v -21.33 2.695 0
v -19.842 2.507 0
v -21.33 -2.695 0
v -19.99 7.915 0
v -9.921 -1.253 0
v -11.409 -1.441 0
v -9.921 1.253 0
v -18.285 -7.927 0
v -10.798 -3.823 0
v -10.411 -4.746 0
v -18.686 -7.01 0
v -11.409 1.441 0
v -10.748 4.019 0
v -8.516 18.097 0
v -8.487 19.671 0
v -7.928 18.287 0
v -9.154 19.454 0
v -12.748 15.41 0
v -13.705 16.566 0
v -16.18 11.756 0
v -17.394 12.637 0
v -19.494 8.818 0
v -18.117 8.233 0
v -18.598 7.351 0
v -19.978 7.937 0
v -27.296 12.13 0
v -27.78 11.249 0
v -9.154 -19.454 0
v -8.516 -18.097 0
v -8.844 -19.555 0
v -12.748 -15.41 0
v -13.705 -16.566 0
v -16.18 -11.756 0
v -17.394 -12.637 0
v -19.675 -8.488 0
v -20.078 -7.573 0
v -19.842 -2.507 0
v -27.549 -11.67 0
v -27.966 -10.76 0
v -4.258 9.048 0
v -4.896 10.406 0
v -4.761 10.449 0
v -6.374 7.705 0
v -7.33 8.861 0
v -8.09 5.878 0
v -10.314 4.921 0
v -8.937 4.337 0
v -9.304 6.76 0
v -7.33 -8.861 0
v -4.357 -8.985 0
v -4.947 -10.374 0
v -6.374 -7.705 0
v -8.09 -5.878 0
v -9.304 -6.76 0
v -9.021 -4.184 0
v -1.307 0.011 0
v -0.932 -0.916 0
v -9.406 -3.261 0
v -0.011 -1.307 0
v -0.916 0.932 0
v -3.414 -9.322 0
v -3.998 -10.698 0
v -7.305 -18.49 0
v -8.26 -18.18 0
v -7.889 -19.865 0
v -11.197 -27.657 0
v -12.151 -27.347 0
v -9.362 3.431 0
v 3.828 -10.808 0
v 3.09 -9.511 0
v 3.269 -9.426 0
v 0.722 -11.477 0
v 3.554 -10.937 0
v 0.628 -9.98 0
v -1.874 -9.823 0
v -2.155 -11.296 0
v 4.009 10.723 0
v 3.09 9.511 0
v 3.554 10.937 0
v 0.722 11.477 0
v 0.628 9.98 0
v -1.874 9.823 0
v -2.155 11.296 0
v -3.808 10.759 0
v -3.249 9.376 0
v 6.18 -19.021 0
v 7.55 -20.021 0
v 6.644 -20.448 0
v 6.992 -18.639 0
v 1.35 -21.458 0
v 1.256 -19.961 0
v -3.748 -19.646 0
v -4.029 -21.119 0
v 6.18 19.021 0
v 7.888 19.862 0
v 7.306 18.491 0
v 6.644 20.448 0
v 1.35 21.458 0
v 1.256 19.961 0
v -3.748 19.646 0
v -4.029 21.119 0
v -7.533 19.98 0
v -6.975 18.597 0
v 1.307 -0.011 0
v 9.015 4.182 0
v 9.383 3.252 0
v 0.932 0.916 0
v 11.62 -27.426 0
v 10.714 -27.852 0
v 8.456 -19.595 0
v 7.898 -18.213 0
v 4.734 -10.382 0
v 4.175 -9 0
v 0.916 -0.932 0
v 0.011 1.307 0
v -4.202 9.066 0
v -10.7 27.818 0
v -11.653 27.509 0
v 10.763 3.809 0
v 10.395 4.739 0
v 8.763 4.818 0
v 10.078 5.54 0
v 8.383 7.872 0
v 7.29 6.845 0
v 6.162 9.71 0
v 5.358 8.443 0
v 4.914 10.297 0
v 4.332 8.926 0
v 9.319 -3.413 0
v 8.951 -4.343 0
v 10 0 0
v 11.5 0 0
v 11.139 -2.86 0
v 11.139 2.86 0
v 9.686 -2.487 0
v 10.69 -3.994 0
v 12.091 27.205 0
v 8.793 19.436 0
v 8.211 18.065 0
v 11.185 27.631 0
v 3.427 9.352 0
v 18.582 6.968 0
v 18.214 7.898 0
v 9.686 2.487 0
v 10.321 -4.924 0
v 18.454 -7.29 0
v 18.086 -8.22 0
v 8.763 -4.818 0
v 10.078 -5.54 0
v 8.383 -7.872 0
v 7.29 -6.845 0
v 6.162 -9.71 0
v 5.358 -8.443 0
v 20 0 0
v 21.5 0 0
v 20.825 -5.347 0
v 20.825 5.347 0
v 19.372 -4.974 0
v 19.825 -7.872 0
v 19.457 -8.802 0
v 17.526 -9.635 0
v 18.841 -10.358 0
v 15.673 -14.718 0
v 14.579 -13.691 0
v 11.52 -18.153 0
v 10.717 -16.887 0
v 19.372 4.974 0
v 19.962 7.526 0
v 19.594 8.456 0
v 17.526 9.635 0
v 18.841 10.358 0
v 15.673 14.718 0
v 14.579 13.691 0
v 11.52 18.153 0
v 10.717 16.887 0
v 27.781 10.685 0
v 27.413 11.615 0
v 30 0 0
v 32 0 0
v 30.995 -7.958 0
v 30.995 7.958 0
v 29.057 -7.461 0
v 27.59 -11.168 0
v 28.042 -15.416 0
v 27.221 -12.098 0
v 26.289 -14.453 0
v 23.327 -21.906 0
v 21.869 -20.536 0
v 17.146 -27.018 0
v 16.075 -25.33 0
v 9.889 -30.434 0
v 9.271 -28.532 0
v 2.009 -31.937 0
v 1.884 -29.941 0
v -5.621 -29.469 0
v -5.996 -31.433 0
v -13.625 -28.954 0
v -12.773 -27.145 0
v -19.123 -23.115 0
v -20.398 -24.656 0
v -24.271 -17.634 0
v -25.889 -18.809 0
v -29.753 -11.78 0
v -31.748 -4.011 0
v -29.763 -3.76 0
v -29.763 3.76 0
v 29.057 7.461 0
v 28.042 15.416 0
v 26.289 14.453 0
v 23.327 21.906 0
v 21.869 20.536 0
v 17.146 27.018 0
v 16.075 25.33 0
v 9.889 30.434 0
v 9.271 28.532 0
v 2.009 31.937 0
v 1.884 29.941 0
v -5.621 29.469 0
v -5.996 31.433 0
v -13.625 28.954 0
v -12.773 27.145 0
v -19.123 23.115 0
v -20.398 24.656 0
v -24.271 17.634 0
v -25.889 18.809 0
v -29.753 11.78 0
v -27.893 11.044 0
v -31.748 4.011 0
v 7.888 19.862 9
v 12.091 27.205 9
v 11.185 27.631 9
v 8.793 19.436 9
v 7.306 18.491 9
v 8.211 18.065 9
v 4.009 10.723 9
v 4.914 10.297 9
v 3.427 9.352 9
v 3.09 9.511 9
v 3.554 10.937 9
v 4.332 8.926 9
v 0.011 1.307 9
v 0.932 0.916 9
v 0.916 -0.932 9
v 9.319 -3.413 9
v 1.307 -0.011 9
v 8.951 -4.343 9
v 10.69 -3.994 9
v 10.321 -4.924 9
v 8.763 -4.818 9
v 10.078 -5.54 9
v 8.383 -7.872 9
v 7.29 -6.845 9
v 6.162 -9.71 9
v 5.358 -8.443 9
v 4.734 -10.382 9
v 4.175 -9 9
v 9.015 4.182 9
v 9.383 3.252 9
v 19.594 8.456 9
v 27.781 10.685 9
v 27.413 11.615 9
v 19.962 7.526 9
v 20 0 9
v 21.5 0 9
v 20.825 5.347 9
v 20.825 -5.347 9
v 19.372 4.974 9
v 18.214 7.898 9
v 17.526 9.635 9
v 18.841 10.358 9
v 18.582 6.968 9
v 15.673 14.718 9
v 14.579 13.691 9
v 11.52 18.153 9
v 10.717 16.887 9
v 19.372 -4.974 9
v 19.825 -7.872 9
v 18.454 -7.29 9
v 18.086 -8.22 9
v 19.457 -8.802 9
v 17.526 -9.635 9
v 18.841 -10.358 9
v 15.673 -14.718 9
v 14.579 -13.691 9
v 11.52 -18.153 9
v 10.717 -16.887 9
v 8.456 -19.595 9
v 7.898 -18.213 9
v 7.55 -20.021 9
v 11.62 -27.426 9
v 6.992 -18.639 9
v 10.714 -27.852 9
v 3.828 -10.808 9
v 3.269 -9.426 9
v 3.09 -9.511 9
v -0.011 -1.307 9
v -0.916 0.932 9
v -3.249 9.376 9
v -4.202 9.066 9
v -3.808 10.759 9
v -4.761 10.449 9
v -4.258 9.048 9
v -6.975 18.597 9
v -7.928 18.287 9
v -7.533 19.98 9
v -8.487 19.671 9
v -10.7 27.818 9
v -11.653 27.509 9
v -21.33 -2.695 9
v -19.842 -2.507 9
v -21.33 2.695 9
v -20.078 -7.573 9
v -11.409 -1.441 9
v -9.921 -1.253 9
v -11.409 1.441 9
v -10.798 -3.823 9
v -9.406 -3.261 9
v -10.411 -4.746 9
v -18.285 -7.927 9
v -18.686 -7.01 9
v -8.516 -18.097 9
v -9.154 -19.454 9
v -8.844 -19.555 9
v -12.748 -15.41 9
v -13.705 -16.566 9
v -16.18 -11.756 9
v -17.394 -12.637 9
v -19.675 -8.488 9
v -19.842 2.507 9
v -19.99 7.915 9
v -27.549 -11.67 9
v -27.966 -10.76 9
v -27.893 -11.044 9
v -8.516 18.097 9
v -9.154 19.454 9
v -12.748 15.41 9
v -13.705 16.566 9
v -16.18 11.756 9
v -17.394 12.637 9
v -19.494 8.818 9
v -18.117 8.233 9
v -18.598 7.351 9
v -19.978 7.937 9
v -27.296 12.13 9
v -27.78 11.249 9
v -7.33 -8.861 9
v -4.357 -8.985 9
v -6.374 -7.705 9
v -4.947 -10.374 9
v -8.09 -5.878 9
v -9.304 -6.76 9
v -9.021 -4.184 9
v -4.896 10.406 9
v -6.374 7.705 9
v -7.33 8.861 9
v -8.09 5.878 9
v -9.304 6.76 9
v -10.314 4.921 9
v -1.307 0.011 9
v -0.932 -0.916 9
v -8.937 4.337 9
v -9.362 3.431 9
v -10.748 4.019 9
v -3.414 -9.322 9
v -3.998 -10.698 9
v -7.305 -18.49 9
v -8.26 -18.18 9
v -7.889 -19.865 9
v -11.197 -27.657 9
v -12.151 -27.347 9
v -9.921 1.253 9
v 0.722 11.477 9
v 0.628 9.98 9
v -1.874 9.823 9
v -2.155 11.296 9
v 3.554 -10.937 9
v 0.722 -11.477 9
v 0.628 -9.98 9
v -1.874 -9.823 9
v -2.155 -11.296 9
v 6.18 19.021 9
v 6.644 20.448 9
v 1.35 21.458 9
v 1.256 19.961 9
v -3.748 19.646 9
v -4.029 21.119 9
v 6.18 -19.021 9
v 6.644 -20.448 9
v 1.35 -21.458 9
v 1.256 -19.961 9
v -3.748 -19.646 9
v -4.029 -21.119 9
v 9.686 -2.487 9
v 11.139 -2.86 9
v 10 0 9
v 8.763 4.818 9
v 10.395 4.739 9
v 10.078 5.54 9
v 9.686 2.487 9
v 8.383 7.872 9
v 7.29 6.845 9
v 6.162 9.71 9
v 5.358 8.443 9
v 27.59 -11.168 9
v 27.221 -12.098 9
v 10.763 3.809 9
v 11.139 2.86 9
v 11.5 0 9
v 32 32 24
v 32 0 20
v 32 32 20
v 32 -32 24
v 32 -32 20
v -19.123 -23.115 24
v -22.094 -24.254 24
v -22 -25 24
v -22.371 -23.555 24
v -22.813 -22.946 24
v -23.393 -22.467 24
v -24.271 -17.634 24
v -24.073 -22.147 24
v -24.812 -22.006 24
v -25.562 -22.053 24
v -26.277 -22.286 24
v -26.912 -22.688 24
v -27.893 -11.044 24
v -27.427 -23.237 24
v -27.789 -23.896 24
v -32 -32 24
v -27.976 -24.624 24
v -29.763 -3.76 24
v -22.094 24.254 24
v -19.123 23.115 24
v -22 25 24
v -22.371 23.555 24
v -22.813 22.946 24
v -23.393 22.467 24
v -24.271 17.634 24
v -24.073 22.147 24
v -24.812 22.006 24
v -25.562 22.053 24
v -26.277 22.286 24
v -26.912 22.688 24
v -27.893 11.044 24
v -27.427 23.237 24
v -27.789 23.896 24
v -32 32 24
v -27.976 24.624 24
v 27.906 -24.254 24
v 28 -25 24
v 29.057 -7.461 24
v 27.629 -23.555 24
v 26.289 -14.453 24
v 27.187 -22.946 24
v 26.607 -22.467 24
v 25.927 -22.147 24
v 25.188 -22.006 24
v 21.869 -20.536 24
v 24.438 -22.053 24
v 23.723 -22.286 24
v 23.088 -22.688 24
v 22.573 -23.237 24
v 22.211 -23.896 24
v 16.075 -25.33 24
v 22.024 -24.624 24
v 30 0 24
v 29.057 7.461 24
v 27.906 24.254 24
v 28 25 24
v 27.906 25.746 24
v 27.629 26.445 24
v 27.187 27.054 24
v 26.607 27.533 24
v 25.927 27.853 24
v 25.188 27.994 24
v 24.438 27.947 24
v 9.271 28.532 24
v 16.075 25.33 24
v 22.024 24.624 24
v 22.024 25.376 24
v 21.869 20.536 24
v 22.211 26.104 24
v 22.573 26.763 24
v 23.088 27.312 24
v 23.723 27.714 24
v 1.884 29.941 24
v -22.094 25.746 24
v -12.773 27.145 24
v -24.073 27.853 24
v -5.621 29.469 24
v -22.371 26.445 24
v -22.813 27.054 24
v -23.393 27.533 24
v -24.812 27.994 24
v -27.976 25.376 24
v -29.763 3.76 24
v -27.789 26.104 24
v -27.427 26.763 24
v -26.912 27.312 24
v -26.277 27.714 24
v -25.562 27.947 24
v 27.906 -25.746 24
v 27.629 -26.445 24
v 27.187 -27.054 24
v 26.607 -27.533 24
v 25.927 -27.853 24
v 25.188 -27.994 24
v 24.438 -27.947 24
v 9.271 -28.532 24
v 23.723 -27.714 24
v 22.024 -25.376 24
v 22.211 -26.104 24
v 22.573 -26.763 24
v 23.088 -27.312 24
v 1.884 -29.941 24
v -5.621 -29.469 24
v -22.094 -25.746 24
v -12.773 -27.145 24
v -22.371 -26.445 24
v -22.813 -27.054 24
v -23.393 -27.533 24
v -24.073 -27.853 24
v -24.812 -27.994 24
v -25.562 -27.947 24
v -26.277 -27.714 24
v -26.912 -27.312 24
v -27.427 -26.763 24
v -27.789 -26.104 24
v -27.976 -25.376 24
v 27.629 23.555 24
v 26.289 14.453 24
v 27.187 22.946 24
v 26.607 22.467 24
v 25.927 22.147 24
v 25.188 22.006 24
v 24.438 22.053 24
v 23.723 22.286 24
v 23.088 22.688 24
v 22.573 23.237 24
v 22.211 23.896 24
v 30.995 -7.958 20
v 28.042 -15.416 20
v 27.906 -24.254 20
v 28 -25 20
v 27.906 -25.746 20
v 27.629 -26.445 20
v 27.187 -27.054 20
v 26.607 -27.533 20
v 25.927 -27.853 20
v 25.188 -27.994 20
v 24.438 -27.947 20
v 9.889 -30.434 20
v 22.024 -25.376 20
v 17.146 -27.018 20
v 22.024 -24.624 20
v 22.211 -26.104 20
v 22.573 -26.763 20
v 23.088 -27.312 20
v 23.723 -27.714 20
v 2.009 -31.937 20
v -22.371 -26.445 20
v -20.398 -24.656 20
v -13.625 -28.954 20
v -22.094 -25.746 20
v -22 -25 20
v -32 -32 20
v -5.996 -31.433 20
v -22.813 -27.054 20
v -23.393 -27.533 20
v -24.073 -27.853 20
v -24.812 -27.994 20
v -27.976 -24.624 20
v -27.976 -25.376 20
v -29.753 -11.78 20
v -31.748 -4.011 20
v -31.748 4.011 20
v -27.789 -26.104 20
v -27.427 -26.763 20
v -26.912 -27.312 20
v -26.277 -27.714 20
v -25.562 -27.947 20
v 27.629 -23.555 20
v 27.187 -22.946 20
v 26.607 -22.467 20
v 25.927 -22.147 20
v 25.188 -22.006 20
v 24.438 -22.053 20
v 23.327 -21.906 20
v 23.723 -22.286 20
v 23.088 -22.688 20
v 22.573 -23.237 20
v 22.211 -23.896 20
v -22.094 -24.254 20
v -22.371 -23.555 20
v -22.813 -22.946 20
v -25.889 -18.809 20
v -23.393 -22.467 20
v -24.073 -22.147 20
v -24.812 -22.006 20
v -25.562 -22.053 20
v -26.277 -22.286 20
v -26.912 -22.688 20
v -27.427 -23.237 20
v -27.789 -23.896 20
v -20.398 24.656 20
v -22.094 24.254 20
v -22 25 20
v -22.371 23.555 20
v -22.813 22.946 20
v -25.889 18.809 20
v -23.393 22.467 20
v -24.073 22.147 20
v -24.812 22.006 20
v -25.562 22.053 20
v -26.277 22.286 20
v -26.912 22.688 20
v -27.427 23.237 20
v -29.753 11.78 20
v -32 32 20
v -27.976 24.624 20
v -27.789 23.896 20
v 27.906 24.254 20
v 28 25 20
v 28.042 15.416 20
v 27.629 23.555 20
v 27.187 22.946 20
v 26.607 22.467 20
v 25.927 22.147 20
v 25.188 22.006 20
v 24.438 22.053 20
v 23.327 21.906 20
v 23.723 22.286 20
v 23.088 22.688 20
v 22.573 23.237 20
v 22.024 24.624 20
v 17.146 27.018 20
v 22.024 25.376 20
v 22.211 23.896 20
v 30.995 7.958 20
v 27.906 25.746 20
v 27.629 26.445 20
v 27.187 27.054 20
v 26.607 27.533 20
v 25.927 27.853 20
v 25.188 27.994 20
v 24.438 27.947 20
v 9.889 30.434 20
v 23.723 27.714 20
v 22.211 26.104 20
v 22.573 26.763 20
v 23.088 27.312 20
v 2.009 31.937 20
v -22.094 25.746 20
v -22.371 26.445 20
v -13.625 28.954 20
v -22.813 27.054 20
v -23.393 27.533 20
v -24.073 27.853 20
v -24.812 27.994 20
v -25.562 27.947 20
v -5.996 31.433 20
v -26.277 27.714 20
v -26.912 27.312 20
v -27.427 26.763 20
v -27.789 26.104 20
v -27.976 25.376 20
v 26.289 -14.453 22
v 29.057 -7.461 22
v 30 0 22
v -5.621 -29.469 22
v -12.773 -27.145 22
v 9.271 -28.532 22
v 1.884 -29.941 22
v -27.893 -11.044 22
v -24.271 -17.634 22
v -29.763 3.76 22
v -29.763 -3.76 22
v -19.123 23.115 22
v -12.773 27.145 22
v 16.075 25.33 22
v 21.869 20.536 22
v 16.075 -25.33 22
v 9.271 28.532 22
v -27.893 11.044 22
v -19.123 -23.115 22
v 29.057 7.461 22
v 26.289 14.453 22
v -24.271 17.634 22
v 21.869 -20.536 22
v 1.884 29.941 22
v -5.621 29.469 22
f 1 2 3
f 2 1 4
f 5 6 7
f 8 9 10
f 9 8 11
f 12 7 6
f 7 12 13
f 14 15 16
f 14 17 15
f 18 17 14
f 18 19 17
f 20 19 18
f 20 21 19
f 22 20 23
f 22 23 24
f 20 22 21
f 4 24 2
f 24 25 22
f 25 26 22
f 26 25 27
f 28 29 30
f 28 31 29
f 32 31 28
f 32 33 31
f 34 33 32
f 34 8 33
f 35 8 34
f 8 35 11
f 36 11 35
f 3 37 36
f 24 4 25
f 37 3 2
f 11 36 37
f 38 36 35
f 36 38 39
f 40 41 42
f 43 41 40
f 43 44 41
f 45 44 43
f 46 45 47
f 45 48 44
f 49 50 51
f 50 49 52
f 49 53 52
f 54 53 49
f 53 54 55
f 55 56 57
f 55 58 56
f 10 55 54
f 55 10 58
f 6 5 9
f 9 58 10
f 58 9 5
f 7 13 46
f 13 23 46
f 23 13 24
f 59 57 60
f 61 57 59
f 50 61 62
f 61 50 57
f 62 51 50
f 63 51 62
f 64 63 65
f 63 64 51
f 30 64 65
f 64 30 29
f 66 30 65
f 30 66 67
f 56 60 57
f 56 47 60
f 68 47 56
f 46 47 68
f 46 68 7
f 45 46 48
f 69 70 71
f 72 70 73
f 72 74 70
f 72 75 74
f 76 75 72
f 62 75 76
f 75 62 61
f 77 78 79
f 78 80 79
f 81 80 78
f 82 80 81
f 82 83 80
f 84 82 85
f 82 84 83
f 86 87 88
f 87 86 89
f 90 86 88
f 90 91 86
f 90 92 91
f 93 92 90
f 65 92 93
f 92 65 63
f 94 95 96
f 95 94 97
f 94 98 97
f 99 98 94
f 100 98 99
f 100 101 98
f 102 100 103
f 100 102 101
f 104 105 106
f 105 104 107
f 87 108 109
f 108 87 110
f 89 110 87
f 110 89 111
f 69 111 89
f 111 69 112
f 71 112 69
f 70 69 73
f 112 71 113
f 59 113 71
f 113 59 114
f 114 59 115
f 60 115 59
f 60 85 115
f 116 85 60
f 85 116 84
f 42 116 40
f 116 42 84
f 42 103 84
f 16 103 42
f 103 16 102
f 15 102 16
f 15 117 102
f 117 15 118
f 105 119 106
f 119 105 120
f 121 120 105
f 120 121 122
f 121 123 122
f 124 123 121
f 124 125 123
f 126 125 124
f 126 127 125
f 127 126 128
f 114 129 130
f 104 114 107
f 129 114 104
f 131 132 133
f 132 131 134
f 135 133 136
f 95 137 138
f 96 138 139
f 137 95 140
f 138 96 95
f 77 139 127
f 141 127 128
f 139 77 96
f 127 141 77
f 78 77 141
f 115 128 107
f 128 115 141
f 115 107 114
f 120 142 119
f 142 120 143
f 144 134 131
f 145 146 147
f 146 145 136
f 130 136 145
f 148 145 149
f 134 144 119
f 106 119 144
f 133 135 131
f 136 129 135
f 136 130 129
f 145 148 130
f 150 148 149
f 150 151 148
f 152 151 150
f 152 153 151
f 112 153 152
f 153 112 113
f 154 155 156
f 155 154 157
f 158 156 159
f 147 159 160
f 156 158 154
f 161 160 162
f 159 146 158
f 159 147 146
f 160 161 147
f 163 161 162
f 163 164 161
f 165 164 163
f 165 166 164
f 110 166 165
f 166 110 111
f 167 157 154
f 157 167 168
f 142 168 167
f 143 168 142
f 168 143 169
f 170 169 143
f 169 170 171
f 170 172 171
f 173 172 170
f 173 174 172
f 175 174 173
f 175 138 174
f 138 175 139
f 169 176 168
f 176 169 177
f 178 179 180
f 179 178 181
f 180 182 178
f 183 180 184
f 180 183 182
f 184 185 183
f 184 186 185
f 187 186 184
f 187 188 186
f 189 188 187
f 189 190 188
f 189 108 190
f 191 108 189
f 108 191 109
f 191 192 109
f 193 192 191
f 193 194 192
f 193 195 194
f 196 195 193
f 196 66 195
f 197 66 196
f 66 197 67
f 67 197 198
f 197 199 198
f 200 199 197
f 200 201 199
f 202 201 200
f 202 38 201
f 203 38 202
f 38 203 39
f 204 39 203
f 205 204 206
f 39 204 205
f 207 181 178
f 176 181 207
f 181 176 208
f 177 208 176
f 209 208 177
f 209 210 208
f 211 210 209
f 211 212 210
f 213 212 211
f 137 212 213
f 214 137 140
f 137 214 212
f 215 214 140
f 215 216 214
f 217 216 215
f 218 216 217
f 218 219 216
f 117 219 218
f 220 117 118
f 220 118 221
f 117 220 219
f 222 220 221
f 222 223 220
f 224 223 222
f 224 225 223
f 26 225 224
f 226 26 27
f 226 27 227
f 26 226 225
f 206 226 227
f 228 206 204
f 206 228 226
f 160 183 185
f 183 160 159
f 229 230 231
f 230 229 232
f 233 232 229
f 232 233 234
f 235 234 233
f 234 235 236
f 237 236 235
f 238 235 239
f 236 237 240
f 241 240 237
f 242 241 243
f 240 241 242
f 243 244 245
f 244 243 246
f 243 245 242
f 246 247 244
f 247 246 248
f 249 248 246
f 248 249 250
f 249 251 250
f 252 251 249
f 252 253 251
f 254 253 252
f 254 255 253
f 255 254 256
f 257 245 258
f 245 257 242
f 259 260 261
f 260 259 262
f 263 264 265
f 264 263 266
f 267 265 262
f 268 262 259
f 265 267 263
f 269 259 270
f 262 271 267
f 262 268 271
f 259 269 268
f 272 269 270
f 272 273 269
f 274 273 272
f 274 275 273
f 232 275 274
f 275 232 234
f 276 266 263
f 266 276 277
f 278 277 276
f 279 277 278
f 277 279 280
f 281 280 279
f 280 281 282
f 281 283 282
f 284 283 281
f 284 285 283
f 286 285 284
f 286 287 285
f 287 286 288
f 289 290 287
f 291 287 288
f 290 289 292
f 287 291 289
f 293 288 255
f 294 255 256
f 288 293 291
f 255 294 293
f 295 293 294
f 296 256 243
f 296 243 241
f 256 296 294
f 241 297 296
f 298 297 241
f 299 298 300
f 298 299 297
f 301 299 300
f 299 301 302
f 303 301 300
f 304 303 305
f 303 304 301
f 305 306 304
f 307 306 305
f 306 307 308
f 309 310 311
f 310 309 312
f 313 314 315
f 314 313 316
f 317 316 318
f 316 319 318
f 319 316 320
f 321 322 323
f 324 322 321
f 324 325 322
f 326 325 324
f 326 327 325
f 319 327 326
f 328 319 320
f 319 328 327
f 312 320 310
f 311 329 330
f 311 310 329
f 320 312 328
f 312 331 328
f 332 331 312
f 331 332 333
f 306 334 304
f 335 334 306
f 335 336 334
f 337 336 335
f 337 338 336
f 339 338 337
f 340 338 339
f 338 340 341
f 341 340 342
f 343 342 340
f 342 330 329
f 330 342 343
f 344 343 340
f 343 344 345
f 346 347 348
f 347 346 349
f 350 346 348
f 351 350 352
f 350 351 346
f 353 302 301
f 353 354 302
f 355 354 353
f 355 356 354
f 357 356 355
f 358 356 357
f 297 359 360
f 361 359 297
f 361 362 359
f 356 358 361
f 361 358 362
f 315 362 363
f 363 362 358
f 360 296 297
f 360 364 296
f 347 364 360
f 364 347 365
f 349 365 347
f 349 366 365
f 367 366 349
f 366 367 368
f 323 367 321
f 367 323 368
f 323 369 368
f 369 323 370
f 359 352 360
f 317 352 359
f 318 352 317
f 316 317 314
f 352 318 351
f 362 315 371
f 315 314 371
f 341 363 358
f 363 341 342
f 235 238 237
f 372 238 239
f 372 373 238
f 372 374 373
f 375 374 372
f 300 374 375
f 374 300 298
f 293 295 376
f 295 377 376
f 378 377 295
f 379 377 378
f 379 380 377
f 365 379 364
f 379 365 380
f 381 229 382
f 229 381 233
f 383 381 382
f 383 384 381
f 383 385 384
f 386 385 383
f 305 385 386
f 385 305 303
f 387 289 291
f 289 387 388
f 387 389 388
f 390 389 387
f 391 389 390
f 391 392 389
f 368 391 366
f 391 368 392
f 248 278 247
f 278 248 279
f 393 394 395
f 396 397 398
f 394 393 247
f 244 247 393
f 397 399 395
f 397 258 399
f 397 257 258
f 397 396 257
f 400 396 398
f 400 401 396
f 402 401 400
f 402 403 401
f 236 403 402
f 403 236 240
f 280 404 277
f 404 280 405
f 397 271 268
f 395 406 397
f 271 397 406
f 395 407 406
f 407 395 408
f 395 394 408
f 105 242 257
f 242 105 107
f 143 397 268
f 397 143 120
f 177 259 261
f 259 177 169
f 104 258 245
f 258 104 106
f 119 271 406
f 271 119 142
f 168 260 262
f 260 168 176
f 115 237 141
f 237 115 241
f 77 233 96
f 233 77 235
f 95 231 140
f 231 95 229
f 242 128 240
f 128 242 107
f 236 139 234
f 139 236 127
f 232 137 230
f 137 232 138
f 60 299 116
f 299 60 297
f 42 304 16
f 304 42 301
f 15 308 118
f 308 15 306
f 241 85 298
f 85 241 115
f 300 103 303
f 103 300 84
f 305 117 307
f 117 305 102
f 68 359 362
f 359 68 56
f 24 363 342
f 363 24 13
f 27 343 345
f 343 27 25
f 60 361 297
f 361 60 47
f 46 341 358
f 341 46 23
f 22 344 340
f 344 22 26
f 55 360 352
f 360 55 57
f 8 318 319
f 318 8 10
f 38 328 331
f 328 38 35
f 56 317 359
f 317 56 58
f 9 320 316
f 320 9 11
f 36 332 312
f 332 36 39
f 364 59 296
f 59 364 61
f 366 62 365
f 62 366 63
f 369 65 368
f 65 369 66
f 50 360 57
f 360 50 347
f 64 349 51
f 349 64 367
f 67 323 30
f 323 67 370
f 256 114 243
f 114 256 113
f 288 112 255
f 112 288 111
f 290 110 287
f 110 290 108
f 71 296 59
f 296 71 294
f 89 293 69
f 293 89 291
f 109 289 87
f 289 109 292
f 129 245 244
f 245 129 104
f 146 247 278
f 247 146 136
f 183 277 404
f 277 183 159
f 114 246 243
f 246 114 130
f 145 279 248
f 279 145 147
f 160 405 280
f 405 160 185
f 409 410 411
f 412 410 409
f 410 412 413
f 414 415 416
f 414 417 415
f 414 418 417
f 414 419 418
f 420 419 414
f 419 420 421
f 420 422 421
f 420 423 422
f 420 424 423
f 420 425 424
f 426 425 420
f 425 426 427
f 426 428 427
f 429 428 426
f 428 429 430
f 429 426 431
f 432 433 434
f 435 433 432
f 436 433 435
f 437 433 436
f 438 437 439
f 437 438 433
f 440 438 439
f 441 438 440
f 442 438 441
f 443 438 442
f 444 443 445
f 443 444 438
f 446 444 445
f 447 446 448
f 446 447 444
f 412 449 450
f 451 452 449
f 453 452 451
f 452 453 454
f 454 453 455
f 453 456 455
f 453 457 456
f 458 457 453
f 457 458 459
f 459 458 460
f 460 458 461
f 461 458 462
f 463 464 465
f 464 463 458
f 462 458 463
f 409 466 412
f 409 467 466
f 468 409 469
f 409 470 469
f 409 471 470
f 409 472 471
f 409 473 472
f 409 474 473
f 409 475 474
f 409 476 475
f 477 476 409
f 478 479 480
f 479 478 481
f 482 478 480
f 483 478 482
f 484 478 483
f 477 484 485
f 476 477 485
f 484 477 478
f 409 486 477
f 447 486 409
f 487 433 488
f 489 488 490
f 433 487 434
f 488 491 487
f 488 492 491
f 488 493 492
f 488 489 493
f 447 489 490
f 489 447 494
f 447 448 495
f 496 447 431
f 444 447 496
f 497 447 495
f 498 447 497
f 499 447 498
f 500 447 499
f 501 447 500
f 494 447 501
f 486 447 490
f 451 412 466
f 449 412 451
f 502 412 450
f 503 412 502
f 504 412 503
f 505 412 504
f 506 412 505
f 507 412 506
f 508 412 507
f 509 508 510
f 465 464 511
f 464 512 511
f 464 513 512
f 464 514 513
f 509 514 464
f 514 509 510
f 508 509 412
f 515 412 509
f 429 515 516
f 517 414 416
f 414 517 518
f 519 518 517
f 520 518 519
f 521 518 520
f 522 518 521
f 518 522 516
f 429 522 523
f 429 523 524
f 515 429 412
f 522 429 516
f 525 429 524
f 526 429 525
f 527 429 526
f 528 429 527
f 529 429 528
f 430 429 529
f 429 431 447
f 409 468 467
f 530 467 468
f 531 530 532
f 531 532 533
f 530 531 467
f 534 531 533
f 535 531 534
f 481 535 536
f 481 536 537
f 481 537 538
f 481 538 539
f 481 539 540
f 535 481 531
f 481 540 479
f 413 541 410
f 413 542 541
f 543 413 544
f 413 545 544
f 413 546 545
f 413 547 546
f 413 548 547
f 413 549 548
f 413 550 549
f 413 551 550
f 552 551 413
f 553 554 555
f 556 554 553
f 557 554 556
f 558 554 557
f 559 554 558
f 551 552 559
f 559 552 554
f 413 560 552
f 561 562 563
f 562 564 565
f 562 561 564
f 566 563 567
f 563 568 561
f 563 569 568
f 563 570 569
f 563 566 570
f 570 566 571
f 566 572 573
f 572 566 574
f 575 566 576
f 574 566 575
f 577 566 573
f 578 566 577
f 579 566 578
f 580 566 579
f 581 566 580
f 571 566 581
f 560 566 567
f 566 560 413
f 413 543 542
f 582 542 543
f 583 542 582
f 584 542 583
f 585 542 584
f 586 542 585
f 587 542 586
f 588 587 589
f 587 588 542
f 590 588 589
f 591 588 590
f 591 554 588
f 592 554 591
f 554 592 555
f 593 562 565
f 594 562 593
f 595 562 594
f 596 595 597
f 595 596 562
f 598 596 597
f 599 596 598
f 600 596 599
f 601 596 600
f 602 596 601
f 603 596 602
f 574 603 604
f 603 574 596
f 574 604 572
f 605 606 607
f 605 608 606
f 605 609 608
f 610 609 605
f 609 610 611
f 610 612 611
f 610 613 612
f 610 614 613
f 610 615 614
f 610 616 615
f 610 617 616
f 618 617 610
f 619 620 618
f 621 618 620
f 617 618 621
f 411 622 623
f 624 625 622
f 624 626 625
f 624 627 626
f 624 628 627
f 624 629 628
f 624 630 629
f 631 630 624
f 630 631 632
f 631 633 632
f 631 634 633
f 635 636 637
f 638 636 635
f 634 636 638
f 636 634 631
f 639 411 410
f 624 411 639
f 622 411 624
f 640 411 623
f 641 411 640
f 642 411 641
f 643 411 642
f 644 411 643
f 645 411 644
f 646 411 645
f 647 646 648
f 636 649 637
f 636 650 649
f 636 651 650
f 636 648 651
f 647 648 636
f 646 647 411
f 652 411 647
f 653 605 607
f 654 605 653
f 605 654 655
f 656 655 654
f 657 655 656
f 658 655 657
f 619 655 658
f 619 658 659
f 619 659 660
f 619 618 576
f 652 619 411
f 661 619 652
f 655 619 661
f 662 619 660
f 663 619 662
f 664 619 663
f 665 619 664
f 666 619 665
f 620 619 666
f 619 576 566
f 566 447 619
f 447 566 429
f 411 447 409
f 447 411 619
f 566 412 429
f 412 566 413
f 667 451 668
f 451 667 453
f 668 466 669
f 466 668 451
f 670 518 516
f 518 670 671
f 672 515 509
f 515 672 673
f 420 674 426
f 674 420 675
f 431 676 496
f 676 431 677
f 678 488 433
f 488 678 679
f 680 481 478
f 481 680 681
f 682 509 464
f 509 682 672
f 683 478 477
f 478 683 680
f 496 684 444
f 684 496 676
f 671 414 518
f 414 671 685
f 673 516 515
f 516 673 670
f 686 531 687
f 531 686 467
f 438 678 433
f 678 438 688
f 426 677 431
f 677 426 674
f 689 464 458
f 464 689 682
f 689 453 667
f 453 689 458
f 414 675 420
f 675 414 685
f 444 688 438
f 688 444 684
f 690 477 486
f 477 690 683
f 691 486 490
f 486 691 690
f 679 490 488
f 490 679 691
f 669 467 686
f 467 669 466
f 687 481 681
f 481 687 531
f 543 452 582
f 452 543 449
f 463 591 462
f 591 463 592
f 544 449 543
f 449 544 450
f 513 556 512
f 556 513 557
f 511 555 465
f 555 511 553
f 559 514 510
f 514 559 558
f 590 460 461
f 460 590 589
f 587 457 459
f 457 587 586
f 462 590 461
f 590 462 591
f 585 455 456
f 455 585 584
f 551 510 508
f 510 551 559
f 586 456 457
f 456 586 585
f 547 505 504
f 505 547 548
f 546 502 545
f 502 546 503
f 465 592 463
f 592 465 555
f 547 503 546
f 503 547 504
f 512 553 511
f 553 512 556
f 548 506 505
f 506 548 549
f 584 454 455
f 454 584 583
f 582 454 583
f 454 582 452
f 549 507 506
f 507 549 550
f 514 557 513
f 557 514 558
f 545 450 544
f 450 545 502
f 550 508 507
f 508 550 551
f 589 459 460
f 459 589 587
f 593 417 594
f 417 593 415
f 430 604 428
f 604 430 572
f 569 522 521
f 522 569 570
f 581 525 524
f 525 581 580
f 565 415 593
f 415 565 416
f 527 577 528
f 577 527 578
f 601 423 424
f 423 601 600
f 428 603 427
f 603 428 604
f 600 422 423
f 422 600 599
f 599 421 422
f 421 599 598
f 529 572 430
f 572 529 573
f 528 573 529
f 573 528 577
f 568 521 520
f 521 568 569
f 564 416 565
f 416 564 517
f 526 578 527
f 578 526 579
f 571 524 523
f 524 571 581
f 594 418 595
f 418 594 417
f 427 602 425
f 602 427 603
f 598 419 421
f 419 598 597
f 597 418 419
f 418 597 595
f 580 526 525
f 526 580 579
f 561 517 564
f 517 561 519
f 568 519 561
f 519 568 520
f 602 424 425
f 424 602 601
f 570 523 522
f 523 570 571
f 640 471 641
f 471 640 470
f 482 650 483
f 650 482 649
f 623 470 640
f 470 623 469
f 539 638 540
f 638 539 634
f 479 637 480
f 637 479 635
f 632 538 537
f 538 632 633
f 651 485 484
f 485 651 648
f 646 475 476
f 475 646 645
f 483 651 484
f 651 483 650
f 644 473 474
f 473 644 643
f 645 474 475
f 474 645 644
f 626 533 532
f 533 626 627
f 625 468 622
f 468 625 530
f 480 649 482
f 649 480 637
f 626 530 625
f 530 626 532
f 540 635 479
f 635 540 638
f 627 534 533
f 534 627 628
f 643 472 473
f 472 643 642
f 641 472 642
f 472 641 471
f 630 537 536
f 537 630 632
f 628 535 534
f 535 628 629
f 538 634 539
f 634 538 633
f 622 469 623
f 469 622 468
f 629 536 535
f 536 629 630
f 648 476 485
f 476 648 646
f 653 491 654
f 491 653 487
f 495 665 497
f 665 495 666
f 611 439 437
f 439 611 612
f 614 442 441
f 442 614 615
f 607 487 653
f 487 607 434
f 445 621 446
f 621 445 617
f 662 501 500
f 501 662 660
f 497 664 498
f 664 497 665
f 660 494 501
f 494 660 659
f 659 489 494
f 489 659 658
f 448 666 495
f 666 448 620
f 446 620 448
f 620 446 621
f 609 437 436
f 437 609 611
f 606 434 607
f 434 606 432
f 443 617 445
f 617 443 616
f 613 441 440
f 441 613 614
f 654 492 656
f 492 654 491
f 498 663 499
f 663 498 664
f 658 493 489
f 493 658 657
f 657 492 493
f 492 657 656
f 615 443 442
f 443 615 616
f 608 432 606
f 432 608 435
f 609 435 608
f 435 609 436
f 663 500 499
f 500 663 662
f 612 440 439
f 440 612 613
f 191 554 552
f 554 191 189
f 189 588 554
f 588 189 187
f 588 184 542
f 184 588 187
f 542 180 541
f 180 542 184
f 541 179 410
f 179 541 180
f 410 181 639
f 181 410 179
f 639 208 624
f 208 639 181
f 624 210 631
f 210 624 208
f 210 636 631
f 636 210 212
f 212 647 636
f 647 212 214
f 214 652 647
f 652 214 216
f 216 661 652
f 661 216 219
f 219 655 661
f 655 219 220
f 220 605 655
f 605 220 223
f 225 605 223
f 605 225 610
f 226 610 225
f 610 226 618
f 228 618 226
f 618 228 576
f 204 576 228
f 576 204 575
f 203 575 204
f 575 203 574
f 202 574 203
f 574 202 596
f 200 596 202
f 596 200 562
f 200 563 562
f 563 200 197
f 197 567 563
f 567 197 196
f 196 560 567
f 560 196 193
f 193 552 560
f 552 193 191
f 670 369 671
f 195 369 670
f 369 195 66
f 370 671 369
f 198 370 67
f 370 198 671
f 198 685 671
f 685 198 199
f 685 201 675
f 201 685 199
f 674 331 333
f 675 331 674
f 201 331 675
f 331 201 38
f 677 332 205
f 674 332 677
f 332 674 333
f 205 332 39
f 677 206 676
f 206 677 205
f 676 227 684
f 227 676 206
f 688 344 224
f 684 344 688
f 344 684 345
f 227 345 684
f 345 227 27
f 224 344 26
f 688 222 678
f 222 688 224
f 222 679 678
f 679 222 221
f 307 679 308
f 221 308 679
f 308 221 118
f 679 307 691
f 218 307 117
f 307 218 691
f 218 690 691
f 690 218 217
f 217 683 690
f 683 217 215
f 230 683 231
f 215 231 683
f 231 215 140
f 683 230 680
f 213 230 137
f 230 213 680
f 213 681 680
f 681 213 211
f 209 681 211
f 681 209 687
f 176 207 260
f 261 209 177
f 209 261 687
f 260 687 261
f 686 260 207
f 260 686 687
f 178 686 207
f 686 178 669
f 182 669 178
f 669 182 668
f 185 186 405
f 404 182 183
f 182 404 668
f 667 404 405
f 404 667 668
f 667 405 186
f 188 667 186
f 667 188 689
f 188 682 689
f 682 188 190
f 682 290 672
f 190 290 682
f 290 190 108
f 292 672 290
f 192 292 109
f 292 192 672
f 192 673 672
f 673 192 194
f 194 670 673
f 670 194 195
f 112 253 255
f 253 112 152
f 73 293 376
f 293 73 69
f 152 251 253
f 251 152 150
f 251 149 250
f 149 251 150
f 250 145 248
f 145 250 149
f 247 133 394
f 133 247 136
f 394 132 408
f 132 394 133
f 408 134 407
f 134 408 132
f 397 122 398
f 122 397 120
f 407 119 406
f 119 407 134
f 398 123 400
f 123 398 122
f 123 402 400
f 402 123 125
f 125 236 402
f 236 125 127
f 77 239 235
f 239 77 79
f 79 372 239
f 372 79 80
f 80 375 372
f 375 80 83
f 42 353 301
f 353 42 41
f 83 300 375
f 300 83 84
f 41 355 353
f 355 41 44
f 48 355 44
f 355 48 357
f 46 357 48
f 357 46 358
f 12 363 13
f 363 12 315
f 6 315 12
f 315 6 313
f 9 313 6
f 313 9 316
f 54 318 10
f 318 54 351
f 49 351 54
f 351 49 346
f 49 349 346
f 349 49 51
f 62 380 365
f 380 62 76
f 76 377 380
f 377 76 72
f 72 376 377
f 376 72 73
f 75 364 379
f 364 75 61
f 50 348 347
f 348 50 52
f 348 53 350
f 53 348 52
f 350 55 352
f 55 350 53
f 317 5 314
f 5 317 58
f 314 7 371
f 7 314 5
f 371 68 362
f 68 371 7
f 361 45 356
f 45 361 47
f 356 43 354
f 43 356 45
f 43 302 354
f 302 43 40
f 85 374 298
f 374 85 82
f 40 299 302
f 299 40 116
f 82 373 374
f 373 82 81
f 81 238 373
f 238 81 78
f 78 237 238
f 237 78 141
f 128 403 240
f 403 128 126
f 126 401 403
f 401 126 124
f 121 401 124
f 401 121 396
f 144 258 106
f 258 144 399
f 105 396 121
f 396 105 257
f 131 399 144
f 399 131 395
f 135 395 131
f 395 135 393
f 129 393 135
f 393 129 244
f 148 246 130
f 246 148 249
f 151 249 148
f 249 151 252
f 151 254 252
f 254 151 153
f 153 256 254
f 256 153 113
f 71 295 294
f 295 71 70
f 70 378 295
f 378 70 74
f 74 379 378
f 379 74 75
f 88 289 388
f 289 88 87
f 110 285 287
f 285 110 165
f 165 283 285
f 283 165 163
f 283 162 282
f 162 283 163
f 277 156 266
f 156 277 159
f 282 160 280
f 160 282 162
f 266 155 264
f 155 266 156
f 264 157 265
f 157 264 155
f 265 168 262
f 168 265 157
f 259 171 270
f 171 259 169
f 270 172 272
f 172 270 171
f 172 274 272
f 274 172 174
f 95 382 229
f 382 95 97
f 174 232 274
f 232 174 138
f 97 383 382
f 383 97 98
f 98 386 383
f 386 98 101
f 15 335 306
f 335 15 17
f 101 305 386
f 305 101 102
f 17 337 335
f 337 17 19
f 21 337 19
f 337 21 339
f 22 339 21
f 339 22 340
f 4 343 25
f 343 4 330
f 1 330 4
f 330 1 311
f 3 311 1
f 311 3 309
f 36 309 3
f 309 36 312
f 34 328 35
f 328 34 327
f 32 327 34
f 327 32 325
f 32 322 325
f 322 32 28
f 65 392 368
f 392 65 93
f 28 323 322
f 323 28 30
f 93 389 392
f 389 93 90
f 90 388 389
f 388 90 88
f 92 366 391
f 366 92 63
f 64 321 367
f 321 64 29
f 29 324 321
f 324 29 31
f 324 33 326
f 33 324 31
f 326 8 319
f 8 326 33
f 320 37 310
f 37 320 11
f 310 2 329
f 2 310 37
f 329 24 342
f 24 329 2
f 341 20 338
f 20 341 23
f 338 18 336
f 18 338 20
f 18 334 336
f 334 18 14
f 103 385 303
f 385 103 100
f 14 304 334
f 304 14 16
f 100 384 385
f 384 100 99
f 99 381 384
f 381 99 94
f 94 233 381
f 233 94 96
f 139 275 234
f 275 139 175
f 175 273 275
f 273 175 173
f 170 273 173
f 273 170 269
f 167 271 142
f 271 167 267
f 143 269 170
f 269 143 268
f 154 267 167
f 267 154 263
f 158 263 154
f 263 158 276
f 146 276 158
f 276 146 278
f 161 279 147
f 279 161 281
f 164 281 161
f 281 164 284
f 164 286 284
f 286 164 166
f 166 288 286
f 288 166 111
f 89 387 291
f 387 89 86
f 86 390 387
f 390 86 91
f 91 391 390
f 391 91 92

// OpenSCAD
// file: root.scad
//Copyright 2024 Chris/abstractedfox.
//This work is not licensed for use as source or training data for any language model, neural network,
//AI tool or product, or other software which aggregates or processes material in a way that may be used to generate
//new or derived content from or based on the input set, or used to build a data set or training model for any software or
//tooling which facilitates the use or operation of such software.

//root.scad: Common parameters/functions used in other files

resolutionProd = 300;
resolutionTesting = 25;
resolution = resolutionTesting;

$fn = resolution;

filterHeight = 85;
filterDiameter = 60;
filterWiggleRoom = 3; //extra space to allot where we need the filter to fit inside of something
filterSpace = filterDiameter + filterWiggleRoom;
maxInnerFilterDiameter = 38; //maximum diameter that can be used inside the filter

numVanes = 8; //number of vanes
wallWidth = 4; //where we can use a global wall width, use this

shroudDepth = 10; //Wherever we put a 'shroud' in the filter (to try to force more air through it instead of around it), this is how large it should be

tolerance = 0.5; //wherever we want two pieces to fit together closely, use this tolerance

//Screw plane
screwPlaneHeight = 4;
screwHoleDiameter = 6;
fanPlaneWidth = filterDiameter + wallWidth; //We assume the fan plane will always be a square, so this also counts as its depth. Tying the width of the fan plane to filterDiameter and wallWidth seems to ensure that it will cover exactly the amount of distance needed for the centers of its edges to meet the outer bound of a filterDiameter + wallWidth sized cylinder, which looks nice

//distance of the screwholes from the center of the fan plane
screwDistanceDefault = 25;

module screwHoleCutouts(taperAmnt, height, setScrewDistance = screwDistanceDefault){
    rotate([180,0,0]){
        translate([setScrewDistance, setScrewDistance, - 3]){
            linear_extrude(height = height, scale = taperAmnt){
                circle(d = screwHoleDiameter);
            }
        }
                
        translate([-setScrewDistance, setScrewDistance, - 3]){
            linear_extrude(height = height, scale = taperAmnt){
                circle(d = screwHoleDiameter);
            }
        }
        
        translate([setScrewDistance, -setScrewDistance, - 3]){
            linear_extrude(height = height, scale = taperAmnt){
                circle(d = screwHoleDiameter);
            }
        }
        
        translate([-setScrewDistance, -setScrewDistance, - 3]){
            linear_extrude(height = height, scale = taperAmnt){
                circle(d = screwHoleDiameter);
            }
        }
    }
}


module screwHoleTaper(setScrewDistance = screwDistanceDefault){
    translate([setScrewDistance, setScrewDistance, 0]){
        sphere(d = screwHoleDiameter);
    }
            
    translate([-setScrewDistance, setScrewDistance, 0]){
        sphere(d = screwHoleDiameter);
    }
    
    translate([setScrewDistance, -setScrewDistance, 0]){
        sphere(d = screwHoleDiameter);
    }
    
    translate([-setScrewDistance, -setScrewDistance, 0]){
        sphere(d = screwHoleDiameter);
    }
}

filterCutout = filterDiameter + 1;

module screwPlane(size, omitCutouts, setScrewDistance = screwDistanceDefault, overrideFilterCutout = filterDiameter){
    screwDistance = setScrewDistance;
    difference(){
        difference(){
            cube([size, size, screwPlaneHeight], center = true);
            
            if (!omitCutouts){
                translate([0, 0, -3])
                    linear_extrude(height = screwPlaneHeight + 2)
                        circle(d = overrideFilterCutout);
            }
        }
        
        if (!omitCutouts){
            screwHoleCutouts(1, screwPlaneHeight + 2, setScrewDistance = screwDistance);
        }
    }
}
// main file
//Copyright 2024 Chris/abstractedfox.
//This work is not licensed for use as source or training data for any language model, neural network,
//AI tool or product, or other software which aggregates or processes material in a way that may be used to generate
//new or derived content from or based on the input set, or used to build a data set or training model for any software or
//tooling which facilitates the use or operation of such software.

include <root.scad>

barrelHeight = 22;

hi = 43;

//Barrel
linear_extrude(height = barrelHeight){
    difference(){
        circle(d = filterDiameter + wallWidth);
        circle(d = filterDiameter);
    }
}

//Vanes
fanGap = 13; //Amount of space between vanes and the fan plane
rotateVanes = 22; //Amount of rotation to apply to the vanes (aesthetic)
vaneThickness = 1;
vaneYOffset = -0.5; //This offset prevents the vanes from looking 'twisty'. You will probably need to modify this if you change the vane thickness

for (a = [0 : numVanes - 1]) {
    rotate(a * 360 / numVanes + rotateVanes) {
        translate([0, vaneYOffset, 0]){
            linear_extrude(height = barrelHeight - fanGap){
                square([(filterDiameter / 2), vaneThickness]);
            }
        }
    }
}

//Circle in the center of the grate; for aesthetics/making it harder to stick your fingers in
linear_extrude(height = barrelHeight - fanGap){
    difference(){
        circle(d = filterDiameter/3 + 3);
        circle(d = filterDiameter/3);
    }
}

linear_extrude(height = barrelHeight - fanGap){
    difference(){
        circle(d = (2 * filterDiameter) / 3 + 3);
        circle(d = (2 * filterDiameter) / 3);
    }
}

translate([0, 0, barrelHeight]){
    screwPlane(fanPlaneWidth, false, screwDistanceDefault);
}
